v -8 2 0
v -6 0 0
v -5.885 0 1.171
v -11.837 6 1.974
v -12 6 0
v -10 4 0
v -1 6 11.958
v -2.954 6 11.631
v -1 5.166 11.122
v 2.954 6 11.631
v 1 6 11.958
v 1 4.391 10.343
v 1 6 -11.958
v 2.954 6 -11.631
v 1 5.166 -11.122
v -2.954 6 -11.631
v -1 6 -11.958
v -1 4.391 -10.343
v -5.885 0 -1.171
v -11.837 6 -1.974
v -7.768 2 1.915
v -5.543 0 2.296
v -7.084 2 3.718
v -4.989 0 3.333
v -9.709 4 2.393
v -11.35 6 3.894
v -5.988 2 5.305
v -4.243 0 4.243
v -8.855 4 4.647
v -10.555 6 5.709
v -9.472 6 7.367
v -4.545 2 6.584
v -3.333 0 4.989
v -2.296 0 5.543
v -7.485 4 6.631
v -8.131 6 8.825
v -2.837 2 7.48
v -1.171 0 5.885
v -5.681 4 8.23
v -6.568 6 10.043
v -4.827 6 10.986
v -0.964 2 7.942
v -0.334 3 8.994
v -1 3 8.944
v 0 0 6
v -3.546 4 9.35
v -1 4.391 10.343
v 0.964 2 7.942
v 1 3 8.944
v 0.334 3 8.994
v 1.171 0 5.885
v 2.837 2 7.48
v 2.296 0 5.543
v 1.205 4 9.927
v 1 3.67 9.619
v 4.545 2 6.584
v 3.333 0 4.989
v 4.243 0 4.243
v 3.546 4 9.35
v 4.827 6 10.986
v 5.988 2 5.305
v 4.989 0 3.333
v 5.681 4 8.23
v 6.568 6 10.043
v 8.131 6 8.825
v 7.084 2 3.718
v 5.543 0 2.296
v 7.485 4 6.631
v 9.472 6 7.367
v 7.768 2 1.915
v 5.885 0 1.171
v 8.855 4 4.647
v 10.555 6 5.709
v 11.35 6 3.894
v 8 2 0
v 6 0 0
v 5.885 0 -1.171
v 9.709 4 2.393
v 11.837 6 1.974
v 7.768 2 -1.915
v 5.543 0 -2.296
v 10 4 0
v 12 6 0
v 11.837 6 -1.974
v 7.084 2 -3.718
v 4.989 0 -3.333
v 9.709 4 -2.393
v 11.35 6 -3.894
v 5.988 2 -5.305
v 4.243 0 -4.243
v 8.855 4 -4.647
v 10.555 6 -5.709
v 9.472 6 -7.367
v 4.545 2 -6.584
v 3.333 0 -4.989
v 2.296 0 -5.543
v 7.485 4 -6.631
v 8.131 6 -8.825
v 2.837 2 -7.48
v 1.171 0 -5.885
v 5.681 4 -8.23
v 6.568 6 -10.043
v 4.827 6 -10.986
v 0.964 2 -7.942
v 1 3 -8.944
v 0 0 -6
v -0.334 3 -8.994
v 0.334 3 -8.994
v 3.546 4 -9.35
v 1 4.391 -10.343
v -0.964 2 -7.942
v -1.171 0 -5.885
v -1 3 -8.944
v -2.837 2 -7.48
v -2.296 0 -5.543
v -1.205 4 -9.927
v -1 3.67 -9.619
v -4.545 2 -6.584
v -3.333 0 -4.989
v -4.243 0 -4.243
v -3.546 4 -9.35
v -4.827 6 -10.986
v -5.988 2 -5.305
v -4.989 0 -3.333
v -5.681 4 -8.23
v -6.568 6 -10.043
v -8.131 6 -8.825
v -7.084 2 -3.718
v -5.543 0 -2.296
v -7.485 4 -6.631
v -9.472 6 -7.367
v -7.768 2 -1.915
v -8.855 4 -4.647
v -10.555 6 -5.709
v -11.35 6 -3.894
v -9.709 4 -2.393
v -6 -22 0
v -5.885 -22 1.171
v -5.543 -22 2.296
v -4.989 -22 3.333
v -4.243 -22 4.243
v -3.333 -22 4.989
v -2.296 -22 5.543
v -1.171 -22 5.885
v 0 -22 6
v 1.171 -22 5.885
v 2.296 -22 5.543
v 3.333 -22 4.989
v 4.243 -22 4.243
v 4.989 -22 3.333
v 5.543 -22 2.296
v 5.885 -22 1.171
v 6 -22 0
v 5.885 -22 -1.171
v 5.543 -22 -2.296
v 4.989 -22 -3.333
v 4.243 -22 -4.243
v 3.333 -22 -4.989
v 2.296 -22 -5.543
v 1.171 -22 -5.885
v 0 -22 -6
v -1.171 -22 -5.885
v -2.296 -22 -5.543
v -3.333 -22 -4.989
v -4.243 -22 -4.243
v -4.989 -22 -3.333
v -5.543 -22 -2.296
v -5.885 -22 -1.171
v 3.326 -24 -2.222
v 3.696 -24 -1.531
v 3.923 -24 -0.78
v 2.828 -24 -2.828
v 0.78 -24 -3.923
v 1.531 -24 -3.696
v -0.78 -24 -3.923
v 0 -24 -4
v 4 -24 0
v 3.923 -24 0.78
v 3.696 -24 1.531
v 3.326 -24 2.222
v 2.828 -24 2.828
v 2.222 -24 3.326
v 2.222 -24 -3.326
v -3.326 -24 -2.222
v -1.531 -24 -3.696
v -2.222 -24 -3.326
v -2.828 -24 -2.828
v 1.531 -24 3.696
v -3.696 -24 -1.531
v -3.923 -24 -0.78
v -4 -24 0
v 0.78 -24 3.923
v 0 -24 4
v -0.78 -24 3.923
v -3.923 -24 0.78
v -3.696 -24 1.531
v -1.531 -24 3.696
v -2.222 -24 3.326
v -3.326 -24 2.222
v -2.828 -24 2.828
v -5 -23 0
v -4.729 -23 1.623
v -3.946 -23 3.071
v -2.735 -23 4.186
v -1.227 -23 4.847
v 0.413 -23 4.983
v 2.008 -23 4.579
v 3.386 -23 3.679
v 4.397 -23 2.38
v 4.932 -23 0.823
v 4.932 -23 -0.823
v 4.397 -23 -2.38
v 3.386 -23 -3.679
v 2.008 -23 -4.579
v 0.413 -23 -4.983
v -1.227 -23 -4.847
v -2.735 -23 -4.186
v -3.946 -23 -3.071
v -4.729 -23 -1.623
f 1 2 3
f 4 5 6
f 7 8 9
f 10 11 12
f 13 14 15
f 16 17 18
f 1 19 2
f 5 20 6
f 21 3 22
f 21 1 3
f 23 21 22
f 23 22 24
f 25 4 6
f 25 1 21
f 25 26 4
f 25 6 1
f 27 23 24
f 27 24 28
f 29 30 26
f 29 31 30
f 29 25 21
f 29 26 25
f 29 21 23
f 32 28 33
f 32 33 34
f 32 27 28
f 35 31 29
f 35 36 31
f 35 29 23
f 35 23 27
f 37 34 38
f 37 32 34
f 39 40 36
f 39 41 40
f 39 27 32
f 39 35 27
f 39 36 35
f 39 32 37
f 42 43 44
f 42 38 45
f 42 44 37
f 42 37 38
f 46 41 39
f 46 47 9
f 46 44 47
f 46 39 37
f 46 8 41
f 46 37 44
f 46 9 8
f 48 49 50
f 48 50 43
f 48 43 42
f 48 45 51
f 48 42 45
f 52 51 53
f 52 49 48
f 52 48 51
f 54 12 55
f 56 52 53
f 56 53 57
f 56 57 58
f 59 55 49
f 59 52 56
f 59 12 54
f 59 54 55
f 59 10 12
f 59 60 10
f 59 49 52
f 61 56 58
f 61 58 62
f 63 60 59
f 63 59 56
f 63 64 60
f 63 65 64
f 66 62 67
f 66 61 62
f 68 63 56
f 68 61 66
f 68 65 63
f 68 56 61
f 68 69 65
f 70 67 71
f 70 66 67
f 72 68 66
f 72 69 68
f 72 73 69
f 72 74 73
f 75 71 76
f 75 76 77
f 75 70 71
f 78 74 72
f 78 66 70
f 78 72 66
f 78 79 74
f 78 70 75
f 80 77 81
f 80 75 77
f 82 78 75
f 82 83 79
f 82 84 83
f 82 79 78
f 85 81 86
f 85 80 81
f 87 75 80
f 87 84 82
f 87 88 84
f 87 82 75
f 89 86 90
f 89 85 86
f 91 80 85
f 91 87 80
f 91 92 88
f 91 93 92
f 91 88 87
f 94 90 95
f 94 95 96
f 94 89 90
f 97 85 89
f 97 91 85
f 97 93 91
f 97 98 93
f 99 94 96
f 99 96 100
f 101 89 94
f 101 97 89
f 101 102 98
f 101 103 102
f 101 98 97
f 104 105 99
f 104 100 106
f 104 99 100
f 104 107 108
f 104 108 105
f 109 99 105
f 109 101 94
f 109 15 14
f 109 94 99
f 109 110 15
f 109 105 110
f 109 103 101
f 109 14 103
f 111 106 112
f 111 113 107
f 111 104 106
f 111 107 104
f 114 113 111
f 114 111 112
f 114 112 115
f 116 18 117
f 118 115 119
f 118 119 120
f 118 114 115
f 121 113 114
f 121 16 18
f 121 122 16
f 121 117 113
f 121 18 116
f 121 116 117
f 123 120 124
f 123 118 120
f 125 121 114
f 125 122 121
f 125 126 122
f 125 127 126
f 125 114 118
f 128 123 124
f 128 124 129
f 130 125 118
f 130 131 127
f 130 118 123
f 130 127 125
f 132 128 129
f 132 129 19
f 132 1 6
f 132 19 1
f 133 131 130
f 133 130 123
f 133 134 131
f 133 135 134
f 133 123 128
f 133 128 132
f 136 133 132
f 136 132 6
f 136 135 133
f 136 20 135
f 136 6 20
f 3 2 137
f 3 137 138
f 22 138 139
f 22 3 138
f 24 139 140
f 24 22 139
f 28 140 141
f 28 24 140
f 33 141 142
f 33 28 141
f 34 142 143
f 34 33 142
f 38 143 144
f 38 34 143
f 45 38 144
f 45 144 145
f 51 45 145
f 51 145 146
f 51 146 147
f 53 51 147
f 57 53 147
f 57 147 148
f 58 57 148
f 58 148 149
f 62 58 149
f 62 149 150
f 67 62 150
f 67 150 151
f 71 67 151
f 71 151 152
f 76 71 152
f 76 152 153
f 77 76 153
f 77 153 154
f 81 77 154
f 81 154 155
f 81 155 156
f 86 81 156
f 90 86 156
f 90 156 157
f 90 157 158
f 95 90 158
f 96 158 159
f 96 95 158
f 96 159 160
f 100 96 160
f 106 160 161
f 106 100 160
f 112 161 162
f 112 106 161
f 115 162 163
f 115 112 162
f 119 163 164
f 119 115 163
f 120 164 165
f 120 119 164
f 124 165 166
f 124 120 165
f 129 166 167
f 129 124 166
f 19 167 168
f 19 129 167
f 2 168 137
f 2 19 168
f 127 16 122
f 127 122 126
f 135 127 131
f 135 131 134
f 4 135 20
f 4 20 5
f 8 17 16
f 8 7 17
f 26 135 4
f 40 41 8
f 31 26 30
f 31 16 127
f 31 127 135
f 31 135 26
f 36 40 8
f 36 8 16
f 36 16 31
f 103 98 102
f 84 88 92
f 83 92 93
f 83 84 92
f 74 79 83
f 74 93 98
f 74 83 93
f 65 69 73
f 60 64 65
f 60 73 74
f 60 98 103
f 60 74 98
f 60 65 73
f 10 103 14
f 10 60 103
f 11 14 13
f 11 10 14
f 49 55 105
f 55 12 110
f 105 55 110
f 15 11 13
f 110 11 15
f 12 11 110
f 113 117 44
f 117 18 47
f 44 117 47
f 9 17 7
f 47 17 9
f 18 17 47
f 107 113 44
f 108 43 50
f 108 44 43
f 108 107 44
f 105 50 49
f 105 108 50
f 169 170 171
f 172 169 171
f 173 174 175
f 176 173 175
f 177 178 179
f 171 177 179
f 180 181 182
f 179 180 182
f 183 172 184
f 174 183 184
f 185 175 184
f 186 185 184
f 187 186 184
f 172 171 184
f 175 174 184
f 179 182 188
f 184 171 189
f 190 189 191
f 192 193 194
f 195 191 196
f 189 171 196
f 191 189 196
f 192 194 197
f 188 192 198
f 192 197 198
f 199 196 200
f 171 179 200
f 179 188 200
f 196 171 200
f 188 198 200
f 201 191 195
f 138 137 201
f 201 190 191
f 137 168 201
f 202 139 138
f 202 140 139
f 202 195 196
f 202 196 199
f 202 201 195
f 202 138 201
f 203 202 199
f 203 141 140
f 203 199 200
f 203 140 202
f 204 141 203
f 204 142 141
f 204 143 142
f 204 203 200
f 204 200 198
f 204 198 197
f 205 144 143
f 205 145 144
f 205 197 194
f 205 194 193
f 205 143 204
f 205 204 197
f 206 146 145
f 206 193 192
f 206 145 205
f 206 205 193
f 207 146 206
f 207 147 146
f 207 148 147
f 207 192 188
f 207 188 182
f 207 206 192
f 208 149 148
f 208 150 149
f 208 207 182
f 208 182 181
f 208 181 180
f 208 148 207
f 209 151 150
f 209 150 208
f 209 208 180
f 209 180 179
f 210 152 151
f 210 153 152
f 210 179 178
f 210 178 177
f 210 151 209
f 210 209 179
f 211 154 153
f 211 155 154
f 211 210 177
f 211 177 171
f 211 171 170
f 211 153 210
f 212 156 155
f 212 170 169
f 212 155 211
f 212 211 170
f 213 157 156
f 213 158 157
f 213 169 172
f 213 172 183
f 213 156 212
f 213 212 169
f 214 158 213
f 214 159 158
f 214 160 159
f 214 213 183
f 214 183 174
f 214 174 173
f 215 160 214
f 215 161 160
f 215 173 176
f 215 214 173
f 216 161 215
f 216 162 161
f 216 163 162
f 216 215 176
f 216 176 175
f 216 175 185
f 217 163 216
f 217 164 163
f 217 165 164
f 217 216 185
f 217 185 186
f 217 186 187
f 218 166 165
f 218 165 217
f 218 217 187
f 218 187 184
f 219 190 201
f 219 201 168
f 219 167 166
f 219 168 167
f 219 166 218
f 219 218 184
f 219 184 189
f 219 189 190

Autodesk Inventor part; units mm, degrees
ref_plane "YZ Plane" through (0, 0, 0) normal (1, 0, 0) x (0, 1, 0)
ref_plane "XZ Plane" through (0, 0, 0) normal (0, 1, 0) x (-1, 0, 0)
ref_plane "XY Plane" through (0, 0, 0) normal (0, 0, 1) x (1, 0, 0)
sketch "Sketch1" plane through (0, 0, 0) normal (0, 1, 0) x (-1, 0, 0)
  circle A0 centre (0, 0) radius 6
  dimension "d0" = 12
extrude "Extrusion1" add sketch "Sketch1" along normal blind 6 draft 45
extrude "Extrusion2" add sketch "Sketch1" against normal blind 24
chamfer "Chamfer1" distance 2 angle 45 1 edges at (6, -24, 0)
thread "Thread1" size "M12x1.75" class "6g" standard "ANSI Metric M Profile" length 155 offset 3
sketch "Sketch2" plane through (0, 6, 0) normal (0, 1, 0) x (1, 0, 0)
  line L0 (1, -12) -> (1, 12)
  line L1 (1, 12) -> (-1, 12)
  line L2 (-1, 12) -> (-1, -12)
  line L3 (-1, -12) -> (1, -12)
  line L4 (1, -12) -> (-1, 12) construction
  line L5 (1, 12) -> (-1, -12) construction
  point P0 (0, 0)
  dimension "d10" = 2
extrude "Extrusion3" cut sketch "Sketch2" against normal blind 3
properties part number "csk.screw" material "Steel, High Strength, Low Alloy"
